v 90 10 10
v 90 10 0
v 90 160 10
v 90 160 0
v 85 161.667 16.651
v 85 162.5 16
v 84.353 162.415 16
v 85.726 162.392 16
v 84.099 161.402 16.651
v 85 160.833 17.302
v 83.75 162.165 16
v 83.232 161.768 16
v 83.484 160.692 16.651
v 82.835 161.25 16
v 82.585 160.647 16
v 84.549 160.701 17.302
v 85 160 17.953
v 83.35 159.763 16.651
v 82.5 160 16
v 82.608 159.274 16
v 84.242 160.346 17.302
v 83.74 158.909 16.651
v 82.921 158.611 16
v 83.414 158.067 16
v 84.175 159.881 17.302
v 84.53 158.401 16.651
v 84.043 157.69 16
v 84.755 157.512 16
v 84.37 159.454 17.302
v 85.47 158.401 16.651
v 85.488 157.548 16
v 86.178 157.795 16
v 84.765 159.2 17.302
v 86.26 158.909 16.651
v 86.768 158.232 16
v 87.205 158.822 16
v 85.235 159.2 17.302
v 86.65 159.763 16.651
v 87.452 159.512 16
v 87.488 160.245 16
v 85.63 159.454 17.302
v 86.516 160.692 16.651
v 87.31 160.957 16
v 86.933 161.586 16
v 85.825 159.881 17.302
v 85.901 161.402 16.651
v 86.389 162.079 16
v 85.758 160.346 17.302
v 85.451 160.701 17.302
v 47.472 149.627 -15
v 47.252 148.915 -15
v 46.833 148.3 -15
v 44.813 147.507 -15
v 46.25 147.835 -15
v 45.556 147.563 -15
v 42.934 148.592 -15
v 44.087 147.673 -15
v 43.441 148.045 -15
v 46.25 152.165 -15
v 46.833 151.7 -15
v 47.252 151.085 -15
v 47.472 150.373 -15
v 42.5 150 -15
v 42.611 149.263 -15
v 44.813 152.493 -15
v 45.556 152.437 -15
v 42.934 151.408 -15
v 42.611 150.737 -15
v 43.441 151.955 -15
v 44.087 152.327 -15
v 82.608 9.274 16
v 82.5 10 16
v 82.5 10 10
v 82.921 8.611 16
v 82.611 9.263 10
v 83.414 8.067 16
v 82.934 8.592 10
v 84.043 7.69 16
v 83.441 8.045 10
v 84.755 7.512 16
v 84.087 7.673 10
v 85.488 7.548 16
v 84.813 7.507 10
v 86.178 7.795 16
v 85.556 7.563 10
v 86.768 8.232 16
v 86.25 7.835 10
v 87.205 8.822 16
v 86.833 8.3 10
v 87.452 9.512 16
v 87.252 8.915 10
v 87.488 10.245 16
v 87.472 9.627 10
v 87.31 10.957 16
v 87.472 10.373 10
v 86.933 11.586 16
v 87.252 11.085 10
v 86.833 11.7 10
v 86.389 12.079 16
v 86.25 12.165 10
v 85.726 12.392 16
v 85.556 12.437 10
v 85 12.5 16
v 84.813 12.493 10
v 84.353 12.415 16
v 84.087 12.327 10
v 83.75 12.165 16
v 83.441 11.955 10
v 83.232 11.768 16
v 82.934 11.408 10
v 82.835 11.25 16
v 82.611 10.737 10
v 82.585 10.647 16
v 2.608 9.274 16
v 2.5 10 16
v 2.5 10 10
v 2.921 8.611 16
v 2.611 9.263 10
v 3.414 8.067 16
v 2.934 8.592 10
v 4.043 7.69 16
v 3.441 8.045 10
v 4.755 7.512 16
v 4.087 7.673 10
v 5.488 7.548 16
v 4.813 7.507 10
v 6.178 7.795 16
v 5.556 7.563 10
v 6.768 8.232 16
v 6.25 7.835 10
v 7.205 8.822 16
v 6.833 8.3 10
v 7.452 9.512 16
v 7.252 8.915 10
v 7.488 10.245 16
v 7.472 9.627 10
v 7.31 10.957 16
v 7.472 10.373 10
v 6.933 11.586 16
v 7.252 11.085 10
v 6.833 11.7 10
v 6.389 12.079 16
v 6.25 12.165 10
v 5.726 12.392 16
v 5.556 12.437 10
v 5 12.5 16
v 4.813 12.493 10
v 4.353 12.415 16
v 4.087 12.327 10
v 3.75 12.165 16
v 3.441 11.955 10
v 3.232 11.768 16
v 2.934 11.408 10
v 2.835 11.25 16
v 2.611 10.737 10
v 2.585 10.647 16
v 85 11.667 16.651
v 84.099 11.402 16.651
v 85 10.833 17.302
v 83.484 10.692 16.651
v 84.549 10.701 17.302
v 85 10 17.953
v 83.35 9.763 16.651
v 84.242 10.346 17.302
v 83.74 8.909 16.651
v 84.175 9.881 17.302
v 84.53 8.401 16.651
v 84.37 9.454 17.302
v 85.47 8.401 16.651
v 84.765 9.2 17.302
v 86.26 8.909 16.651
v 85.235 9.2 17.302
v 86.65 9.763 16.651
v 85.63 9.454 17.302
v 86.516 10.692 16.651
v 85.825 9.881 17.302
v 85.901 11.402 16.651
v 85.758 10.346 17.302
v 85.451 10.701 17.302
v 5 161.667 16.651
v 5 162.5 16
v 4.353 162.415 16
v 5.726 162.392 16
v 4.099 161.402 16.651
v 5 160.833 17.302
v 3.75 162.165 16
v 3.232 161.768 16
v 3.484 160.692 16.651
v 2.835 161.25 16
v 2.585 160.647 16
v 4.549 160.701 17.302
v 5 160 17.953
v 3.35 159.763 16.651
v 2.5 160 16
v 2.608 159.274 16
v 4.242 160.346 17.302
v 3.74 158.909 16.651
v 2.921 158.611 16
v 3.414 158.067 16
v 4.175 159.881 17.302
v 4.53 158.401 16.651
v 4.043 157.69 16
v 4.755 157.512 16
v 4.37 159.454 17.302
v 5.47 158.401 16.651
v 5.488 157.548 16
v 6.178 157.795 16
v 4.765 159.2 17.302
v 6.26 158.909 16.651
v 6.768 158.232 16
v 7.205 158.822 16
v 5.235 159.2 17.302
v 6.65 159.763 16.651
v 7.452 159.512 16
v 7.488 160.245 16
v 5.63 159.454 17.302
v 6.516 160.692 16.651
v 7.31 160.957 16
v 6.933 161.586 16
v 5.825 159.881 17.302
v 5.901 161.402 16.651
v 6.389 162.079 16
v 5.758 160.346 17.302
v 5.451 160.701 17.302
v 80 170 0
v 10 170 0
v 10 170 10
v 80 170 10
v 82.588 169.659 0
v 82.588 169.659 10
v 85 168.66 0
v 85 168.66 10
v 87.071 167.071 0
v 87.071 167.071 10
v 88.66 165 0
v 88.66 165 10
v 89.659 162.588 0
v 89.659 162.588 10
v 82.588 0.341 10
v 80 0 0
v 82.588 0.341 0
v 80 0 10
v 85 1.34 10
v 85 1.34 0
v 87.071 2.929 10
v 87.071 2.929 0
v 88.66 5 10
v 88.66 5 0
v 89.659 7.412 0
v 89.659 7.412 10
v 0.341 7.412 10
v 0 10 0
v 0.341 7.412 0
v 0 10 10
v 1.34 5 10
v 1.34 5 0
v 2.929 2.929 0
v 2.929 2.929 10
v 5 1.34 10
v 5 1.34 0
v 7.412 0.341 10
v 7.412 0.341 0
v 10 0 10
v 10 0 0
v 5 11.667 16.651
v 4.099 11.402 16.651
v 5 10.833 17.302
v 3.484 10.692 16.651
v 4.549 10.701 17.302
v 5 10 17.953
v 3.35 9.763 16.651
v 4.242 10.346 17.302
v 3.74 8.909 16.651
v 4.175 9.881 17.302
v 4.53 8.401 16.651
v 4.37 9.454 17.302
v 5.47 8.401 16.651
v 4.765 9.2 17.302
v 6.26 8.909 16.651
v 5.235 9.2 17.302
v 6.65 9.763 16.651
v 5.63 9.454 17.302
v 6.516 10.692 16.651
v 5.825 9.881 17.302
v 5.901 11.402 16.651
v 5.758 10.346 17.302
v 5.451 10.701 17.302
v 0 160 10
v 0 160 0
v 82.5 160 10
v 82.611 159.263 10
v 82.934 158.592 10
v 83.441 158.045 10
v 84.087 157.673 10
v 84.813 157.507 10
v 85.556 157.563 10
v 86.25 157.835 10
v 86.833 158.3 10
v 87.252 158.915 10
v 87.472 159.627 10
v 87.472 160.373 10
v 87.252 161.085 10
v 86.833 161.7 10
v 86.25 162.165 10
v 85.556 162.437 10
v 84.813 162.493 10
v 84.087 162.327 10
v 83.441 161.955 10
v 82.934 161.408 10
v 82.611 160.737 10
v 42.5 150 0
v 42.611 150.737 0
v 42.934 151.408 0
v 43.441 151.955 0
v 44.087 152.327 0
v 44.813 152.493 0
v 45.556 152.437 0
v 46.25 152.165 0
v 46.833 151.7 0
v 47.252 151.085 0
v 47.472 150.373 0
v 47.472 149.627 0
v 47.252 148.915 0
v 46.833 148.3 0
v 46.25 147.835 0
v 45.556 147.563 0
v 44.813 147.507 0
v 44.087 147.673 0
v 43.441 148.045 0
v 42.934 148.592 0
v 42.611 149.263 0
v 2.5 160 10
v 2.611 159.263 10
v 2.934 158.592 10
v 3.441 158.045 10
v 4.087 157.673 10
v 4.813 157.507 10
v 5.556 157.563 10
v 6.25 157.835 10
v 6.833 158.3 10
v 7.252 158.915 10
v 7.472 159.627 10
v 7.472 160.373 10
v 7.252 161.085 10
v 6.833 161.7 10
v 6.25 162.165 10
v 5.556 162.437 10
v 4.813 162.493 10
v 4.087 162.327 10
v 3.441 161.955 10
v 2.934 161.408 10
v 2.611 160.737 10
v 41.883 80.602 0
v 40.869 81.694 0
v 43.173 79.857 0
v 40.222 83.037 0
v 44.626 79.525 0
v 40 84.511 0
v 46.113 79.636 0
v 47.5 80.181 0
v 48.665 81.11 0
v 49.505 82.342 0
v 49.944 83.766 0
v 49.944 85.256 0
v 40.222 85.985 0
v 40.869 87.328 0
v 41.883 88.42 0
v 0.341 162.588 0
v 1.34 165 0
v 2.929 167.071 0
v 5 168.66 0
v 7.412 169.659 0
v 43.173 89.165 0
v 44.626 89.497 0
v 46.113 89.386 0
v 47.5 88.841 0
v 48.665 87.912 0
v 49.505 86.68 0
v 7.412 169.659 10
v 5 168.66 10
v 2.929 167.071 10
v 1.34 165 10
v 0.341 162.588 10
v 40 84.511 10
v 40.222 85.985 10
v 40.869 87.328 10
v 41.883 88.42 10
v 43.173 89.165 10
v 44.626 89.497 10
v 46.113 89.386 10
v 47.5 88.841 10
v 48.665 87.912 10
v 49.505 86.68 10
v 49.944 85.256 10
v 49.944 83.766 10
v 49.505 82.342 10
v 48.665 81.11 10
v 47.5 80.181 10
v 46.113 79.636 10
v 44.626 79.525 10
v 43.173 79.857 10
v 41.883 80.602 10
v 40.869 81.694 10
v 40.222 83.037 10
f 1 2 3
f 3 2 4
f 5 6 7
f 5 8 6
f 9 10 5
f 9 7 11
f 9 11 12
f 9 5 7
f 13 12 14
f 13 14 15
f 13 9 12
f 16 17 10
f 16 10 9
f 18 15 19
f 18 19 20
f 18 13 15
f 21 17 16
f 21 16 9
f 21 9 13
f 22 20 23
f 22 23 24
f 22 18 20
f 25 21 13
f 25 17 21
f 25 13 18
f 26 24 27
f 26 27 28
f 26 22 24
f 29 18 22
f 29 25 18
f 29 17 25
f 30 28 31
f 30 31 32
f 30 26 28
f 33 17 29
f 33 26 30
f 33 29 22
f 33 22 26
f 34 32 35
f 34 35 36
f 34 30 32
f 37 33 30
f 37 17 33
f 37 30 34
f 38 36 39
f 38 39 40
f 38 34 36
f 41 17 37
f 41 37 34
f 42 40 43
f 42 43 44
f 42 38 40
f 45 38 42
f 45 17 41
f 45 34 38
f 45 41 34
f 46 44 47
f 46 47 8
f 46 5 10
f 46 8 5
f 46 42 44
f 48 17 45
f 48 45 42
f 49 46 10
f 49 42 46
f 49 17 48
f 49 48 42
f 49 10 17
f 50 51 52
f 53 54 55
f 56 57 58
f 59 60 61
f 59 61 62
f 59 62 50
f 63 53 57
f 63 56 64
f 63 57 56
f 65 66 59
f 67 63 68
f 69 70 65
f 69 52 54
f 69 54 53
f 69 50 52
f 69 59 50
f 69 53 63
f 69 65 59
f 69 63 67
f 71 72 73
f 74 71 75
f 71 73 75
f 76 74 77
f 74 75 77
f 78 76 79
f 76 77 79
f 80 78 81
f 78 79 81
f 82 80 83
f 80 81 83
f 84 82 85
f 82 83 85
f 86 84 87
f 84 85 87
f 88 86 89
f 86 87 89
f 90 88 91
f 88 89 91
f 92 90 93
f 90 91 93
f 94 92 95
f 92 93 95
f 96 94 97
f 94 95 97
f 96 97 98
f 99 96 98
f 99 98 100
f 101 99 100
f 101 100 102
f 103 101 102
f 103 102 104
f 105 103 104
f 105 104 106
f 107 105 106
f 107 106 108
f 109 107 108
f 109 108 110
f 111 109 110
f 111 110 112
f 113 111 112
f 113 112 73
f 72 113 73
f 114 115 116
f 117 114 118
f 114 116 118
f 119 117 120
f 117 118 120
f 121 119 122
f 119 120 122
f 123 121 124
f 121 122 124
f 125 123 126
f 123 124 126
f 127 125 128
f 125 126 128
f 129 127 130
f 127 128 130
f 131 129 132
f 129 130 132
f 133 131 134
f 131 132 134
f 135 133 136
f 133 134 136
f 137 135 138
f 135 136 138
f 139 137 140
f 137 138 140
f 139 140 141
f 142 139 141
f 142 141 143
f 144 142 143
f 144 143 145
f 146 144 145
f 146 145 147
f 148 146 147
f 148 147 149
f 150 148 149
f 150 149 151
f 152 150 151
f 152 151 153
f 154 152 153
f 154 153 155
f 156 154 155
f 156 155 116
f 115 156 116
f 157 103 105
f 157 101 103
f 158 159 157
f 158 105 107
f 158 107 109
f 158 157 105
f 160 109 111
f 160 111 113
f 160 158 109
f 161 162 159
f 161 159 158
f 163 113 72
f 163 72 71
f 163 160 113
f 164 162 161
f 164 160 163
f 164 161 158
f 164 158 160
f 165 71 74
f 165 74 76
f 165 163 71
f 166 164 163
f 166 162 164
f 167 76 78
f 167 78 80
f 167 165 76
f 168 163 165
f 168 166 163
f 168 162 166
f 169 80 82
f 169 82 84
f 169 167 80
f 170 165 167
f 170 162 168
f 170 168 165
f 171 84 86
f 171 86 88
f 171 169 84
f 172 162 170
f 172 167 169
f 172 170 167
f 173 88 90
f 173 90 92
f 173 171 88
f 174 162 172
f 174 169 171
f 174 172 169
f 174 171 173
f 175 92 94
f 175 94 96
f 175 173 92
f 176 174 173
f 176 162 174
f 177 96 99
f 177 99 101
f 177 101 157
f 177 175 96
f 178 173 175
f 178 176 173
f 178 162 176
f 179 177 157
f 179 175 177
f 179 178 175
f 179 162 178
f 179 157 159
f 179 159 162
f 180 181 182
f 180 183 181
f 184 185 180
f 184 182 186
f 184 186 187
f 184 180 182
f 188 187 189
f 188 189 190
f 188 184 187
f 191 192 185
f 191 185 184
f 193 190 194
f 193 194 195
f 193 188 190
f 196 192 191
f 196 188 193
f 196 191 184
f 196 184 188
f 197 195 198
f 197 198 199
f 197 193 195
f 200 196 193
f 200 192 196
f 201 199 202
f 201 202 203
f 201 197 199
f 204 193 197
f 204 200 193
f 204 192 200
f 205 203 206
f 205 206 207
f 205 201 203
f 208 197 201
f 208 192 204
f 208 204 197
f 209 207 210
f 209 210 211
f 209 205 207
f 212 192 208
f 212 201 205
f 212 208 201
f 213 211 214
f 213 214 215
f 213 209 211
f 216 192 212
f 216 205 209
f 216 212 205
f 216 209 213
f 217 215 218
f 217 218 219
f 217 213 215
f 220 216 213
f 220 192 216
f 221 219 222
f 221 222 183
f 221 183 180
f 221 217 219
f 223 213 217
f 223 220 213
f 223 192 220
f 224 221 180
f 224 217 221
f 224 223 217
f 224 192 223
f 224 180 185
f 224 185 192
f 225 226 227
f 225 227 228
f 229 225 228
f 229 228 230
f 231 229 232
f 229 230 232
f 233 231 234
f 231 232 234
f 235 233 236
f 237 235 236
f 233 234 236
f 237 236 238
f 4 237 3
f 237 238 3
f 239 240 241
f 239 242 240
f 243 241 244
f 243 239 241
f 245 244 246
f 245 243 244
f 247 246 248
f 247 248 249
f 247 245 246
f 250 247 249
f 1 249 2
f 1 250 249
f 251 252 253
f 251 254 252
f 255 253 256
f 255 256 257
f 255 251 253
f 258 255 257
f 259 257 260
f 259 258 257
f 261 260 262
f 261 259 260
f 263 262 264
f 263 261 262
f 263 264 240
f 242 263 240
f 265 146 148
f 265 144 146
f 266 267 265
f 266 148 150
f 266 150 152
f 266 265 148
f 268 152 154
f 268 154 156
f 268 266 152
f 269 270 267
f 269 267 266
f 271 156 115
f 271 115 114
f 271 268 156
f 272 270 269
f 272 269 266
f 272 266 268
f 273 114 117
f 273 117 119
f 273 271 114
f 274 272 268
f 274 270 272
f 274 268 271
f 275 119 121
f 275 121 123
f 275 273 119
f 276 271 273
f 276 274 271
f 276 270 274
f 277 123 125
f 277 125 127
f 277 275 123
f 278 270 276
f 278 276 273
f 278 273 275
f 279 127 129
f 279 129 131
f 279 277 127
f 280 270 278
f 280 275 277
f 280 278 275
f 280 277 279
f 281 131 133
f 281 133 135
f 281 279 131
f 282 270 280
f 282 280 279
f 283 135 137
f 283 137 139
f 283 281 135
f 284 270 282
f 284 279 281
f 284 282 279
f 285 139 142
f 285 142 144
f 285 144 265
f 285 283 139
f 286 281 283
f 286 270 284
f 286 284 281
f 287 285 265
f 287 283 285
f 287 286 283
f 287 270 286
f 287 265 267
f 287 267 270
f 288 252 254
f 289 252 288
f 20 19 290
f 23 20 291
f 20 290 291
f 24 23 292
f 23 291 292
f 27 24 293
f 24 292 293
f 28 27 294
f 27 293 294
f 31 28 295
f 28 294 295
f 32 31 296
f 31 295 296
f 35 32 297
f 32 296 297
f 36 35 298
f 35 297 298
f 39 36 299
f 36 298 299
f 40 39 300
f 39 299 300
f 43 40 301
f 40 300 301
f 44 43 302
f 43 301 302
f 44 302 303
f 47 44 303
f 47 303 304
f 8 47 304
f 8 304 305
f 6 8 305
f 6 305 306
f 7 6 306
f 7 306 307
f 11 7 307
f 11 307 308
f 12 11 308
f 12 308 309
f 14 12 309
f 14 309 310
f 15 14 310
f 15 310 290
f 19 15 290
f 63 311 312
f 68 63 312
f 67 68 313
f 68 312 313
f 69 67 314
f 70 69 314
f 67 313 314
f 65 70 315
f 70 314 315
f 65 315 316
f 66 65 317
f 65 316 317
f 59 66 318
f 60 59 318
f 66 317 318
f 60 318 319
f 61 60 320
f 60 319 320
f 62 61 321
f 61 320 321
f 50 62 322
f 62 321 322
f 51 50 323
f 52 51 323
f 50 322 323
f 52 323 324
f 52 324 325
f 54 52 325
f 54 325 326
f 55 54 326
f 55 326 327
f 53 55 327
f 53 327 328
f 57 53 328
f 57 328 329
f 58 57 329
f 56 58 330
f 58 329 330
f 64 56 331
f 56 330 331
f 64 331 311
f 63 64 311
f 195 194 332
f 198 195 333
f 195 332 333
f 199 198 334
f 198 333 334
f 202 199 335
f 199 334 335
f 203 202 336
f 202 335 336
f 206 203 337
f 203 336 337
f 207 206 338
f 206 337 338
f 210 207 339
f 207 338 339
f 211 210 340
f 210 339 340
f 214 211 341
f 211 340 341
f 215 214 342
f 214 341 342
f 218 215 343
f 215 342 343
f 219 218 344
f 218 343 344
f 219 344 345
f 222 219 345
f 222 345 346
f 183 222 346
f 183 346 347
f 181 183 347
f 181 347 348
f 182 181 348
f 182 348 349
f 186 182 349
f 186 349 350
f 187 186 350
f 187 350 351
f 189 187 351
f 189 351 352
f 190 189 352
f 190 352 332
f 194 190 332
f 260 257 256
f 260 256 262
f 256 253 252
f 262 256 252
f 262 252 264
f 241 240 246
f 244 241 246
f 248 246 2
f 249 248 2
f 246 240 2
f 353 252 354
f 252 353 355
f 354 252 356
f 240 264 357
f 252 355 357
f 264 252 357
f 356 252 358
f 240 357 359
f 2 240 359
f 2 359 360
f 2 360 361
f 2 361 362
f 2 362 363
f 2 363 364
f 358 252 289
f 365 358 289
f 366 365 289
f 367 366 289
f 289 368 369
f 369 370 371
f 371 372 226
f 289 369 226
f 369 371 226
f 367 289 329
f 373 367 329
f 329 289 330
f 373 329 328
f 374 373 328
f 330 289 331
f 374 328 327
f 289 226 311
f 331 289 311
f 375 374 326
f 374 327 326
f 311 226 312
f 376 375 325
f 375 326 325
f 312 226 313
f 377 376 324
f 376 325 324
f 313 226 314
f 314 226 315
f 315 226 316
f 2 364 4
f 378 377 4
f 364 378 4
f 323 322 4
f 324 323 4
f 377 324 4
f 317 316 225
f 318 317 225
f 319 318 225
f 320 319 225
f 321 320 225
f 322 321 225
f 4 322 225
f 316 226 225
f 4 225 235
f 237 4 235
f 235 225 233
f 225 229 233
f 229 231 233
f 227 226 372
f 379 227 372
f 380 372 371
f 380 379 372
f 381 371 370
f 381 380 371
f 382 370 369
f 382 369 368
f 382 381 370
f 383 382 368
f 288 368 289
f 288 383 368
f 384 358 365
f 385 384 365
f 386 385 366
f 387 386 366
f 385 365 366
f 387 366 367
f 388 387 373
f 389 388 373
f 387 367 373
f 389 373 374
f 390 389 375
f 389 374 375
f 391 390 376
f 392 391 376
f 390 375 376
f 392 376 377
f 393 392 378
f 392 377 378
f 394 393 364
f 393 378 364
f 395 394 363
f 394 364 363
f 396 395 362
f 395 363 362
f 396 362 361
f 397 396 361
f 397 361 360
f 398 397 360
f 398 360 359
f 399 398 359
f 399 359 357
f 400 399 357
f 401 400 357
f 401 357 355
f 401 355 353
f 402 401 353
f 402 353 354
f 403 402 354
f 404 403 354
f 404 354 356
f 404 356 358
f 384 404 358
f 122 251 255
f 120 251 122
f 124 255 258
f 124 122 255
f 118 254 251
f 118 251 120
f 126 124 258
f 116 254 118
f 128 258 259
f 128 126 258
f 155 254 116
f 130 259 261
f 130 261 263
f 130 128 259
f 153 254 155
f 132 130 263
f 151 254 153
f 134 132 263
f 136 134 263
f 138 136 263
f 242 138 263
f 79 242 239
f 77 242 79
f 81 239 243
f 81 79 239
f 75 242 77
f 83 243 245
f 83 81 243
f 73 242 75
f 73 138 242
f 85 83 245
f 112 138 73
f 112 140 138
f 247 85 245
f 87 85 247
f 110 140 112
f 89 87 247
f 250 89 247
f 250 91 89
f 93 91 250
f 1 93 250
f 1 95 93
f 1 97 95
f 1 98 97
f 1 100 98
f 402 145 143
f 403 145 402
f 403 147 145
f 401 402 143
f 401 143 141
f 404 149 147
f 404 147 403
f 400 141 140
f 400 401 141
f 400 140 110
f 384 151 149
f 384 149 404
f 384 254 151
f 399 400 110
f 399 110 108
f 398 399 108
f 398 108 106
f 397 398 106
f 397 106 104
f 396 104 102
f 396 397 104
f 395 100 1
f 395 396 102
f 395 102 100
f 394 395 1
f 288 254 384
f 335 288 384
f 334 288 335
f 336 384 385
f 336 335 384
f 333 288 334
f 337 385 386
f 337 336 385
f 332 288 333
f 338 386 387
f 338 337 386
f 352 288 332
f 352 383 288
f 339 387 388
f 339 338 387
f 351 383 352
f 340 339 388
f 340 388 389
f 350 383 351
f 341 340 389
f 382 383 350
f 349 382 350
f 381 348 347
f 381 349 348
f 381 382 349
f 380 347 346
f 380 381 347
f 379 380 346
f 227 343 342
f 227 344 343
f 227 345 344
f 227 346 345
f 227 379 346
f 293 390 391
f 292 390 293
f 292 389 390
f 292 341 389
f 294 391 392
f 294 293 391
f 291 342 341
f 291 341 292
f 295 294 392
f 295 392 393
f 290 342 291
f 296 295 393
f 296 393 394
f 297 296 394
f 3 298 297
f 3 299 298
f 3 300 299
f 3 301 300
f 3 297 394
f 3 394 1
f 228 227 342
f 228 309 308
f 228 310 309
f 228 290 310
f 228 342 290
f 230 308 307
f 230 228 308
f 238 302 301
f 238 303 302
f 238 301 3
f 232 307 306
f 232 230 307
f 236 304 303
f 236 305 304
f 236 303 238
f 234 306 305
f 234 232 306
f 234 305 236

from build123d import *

# Parameters (mm, degrees)
SKETCH2_W           = 90
SKETCH2_H           = 170
BOSS_EXTRUDE1_DEPTH = 10
SKETCH3_R           = 2.5
BOSS_EXTRUDE4_DEPTH = 6
SKETCH9_R           = 2.5
BOSS_EXTRUDE6_DEPTH = 15
SKETCH10_R          = 5
CUT_EXTRUDE3_DEPTH  = 15
FILLET1_R           = 10
FILLET2_R           = 10
FILLET3_R           = 10
FILLET4_R           = 10


with BuildPart() as part:
    # Sketch2 → Boss-Extrude1 (new body)
    with BuildSketch(Plane.XY):
        with Locations((45, 85)):
            Rectangle(SKETCH2_W, SKETCH2_H)
    extrude(amount=BOSS_EXTRUDE1_DEPTH)

    # Sketch3 → Boss-Extrude4 (add)
    with BuildSketch(Plane.XY.offset(10)):
        with Locations(Location((5, 160, 0), (0, 0, 180))):
            Circle(SKETCH3_R)
        with Locations(Location((85, 160, 0), (0, 0, 180))):
            Circle(SKETCH3_R)
        with Locations(Location((85, 10, 0), (0, 0, 180))):
            Circle(SKETCH3_R)
        with Locations(Location((5, 10, 0), (0, 0, 180))):
            Circle(SKETCH3_R)
    extrude(amount=BOSS_EXTRUDE4_DEPTH)

    # Boss-Extrude5 cone 1 section (through the dimple's axis) → Boss-Extrude5 (revolve)
    with BuildSketch(Plane(origin=(5, 160, 16), x_dir=(0, 1, 0), z_dir=(1, 0, 0))):
        Polygon((0, 0), (2.5, 0), (0, 1.953214066), align=None)
    revolve(axis=Axis((5, 160, 16), (0, 0, 1)))

    # Boss-Extrude5 cone 2 section (through the dimple's axis) → Boss-Extrude5 cone 2 (revolve)
    with BuildSketch(Plane(origin=(85, 160, 16), x_dir=(0, 1, 0), z_dir=(1, 0, 0))):
        Polygon((0, 0), (2.5, 0), (0, 1.953214066), align=None)
    revolve(axis=Axis((85, 160, 16), (0, 0, 1)))

    # Boss-Extrude5 cone 3 section (through the dimple's axis) → Boss-Extrude5 cone 3 (revolve)
    with BuildSketch(Plane(origin=(85, 10, 16), x_dir=(0, 1, 0), z_dir=(1, 0, 0))):
        Polygon((0, 0), (2.5, 0), (0, 1.953214066), align=None)
    revolve(axis=Axis((85, 10, 16), (0, 0, 1)))

    # Boss-Extrude5 cone 4 section (through the dimple's axis) → Boss-Extrude5 cone 4 (revolve)
    with BuildSketch(Plane(origin=(5, 10, 16), x_dir=(0, 1, 0), z_dir=(1, 0, 0))):
        Polygon((0, 0), (2.5, 0), (0, 1.953214066), align=None)
    revolve(axis=Axis((5, 10, 16), (0, 0, 1)))

    # Sketch9 → Boss-Extrude6 (add)
    with BuildSketch(Plane(origin=(0, 0, 0), x_dir=(-1, 0, 0), z_dir=(0, 0, -1))):
        with Locations((-45, 150)):
            Circle(SKETCH9_R)
    extrude(amount=BOSS_EXTRUDE6_DEPTH)

    # Sketch10 → Cut-Extrude3 (cut)
    with BuildSketch(Plane(origin=(0, 0, 0), x_dir=(-1, 0, 0), z_dir=(0, 0, -1))):
        with Locations((-45, 84.5110045)):
            Circle(SKETCH10_R)
    extrude(amount=-CUT_EXTRUDE3_DEPTH, mode=Mode.SUBTRACT)

    # Fillet1
    fillet1_edges = [part.edges().sort_by_distance(p)[0] for p in [
        (90, 170, 5),
    ]]
    fillet(fillet1_edges, radius=FILLET1_R)

    # Fillet2
    fillet2_edges = [part.edges().sort_by_distance(p)[0] for p in [
        (0, 170, 5),
    ]]
    fillet(fillet2_edges, radius=FILLET2_R)

    # Fillet3
    fillet3_edges = [part.edges().sort_by_distance(p)[0] for p in [
        (0, 0, 5),
    ]]
    fillet(fillet3_edges, radius=FILLET3_R)

    # Fillet4
    fillet4_edges = [part.edges().sort_by_distance(p)[0] for p in [
        (90, 0, 5),
    ]]
    fillet(fillet4_edges, radius=FILLET4_R)


solid = part.part
